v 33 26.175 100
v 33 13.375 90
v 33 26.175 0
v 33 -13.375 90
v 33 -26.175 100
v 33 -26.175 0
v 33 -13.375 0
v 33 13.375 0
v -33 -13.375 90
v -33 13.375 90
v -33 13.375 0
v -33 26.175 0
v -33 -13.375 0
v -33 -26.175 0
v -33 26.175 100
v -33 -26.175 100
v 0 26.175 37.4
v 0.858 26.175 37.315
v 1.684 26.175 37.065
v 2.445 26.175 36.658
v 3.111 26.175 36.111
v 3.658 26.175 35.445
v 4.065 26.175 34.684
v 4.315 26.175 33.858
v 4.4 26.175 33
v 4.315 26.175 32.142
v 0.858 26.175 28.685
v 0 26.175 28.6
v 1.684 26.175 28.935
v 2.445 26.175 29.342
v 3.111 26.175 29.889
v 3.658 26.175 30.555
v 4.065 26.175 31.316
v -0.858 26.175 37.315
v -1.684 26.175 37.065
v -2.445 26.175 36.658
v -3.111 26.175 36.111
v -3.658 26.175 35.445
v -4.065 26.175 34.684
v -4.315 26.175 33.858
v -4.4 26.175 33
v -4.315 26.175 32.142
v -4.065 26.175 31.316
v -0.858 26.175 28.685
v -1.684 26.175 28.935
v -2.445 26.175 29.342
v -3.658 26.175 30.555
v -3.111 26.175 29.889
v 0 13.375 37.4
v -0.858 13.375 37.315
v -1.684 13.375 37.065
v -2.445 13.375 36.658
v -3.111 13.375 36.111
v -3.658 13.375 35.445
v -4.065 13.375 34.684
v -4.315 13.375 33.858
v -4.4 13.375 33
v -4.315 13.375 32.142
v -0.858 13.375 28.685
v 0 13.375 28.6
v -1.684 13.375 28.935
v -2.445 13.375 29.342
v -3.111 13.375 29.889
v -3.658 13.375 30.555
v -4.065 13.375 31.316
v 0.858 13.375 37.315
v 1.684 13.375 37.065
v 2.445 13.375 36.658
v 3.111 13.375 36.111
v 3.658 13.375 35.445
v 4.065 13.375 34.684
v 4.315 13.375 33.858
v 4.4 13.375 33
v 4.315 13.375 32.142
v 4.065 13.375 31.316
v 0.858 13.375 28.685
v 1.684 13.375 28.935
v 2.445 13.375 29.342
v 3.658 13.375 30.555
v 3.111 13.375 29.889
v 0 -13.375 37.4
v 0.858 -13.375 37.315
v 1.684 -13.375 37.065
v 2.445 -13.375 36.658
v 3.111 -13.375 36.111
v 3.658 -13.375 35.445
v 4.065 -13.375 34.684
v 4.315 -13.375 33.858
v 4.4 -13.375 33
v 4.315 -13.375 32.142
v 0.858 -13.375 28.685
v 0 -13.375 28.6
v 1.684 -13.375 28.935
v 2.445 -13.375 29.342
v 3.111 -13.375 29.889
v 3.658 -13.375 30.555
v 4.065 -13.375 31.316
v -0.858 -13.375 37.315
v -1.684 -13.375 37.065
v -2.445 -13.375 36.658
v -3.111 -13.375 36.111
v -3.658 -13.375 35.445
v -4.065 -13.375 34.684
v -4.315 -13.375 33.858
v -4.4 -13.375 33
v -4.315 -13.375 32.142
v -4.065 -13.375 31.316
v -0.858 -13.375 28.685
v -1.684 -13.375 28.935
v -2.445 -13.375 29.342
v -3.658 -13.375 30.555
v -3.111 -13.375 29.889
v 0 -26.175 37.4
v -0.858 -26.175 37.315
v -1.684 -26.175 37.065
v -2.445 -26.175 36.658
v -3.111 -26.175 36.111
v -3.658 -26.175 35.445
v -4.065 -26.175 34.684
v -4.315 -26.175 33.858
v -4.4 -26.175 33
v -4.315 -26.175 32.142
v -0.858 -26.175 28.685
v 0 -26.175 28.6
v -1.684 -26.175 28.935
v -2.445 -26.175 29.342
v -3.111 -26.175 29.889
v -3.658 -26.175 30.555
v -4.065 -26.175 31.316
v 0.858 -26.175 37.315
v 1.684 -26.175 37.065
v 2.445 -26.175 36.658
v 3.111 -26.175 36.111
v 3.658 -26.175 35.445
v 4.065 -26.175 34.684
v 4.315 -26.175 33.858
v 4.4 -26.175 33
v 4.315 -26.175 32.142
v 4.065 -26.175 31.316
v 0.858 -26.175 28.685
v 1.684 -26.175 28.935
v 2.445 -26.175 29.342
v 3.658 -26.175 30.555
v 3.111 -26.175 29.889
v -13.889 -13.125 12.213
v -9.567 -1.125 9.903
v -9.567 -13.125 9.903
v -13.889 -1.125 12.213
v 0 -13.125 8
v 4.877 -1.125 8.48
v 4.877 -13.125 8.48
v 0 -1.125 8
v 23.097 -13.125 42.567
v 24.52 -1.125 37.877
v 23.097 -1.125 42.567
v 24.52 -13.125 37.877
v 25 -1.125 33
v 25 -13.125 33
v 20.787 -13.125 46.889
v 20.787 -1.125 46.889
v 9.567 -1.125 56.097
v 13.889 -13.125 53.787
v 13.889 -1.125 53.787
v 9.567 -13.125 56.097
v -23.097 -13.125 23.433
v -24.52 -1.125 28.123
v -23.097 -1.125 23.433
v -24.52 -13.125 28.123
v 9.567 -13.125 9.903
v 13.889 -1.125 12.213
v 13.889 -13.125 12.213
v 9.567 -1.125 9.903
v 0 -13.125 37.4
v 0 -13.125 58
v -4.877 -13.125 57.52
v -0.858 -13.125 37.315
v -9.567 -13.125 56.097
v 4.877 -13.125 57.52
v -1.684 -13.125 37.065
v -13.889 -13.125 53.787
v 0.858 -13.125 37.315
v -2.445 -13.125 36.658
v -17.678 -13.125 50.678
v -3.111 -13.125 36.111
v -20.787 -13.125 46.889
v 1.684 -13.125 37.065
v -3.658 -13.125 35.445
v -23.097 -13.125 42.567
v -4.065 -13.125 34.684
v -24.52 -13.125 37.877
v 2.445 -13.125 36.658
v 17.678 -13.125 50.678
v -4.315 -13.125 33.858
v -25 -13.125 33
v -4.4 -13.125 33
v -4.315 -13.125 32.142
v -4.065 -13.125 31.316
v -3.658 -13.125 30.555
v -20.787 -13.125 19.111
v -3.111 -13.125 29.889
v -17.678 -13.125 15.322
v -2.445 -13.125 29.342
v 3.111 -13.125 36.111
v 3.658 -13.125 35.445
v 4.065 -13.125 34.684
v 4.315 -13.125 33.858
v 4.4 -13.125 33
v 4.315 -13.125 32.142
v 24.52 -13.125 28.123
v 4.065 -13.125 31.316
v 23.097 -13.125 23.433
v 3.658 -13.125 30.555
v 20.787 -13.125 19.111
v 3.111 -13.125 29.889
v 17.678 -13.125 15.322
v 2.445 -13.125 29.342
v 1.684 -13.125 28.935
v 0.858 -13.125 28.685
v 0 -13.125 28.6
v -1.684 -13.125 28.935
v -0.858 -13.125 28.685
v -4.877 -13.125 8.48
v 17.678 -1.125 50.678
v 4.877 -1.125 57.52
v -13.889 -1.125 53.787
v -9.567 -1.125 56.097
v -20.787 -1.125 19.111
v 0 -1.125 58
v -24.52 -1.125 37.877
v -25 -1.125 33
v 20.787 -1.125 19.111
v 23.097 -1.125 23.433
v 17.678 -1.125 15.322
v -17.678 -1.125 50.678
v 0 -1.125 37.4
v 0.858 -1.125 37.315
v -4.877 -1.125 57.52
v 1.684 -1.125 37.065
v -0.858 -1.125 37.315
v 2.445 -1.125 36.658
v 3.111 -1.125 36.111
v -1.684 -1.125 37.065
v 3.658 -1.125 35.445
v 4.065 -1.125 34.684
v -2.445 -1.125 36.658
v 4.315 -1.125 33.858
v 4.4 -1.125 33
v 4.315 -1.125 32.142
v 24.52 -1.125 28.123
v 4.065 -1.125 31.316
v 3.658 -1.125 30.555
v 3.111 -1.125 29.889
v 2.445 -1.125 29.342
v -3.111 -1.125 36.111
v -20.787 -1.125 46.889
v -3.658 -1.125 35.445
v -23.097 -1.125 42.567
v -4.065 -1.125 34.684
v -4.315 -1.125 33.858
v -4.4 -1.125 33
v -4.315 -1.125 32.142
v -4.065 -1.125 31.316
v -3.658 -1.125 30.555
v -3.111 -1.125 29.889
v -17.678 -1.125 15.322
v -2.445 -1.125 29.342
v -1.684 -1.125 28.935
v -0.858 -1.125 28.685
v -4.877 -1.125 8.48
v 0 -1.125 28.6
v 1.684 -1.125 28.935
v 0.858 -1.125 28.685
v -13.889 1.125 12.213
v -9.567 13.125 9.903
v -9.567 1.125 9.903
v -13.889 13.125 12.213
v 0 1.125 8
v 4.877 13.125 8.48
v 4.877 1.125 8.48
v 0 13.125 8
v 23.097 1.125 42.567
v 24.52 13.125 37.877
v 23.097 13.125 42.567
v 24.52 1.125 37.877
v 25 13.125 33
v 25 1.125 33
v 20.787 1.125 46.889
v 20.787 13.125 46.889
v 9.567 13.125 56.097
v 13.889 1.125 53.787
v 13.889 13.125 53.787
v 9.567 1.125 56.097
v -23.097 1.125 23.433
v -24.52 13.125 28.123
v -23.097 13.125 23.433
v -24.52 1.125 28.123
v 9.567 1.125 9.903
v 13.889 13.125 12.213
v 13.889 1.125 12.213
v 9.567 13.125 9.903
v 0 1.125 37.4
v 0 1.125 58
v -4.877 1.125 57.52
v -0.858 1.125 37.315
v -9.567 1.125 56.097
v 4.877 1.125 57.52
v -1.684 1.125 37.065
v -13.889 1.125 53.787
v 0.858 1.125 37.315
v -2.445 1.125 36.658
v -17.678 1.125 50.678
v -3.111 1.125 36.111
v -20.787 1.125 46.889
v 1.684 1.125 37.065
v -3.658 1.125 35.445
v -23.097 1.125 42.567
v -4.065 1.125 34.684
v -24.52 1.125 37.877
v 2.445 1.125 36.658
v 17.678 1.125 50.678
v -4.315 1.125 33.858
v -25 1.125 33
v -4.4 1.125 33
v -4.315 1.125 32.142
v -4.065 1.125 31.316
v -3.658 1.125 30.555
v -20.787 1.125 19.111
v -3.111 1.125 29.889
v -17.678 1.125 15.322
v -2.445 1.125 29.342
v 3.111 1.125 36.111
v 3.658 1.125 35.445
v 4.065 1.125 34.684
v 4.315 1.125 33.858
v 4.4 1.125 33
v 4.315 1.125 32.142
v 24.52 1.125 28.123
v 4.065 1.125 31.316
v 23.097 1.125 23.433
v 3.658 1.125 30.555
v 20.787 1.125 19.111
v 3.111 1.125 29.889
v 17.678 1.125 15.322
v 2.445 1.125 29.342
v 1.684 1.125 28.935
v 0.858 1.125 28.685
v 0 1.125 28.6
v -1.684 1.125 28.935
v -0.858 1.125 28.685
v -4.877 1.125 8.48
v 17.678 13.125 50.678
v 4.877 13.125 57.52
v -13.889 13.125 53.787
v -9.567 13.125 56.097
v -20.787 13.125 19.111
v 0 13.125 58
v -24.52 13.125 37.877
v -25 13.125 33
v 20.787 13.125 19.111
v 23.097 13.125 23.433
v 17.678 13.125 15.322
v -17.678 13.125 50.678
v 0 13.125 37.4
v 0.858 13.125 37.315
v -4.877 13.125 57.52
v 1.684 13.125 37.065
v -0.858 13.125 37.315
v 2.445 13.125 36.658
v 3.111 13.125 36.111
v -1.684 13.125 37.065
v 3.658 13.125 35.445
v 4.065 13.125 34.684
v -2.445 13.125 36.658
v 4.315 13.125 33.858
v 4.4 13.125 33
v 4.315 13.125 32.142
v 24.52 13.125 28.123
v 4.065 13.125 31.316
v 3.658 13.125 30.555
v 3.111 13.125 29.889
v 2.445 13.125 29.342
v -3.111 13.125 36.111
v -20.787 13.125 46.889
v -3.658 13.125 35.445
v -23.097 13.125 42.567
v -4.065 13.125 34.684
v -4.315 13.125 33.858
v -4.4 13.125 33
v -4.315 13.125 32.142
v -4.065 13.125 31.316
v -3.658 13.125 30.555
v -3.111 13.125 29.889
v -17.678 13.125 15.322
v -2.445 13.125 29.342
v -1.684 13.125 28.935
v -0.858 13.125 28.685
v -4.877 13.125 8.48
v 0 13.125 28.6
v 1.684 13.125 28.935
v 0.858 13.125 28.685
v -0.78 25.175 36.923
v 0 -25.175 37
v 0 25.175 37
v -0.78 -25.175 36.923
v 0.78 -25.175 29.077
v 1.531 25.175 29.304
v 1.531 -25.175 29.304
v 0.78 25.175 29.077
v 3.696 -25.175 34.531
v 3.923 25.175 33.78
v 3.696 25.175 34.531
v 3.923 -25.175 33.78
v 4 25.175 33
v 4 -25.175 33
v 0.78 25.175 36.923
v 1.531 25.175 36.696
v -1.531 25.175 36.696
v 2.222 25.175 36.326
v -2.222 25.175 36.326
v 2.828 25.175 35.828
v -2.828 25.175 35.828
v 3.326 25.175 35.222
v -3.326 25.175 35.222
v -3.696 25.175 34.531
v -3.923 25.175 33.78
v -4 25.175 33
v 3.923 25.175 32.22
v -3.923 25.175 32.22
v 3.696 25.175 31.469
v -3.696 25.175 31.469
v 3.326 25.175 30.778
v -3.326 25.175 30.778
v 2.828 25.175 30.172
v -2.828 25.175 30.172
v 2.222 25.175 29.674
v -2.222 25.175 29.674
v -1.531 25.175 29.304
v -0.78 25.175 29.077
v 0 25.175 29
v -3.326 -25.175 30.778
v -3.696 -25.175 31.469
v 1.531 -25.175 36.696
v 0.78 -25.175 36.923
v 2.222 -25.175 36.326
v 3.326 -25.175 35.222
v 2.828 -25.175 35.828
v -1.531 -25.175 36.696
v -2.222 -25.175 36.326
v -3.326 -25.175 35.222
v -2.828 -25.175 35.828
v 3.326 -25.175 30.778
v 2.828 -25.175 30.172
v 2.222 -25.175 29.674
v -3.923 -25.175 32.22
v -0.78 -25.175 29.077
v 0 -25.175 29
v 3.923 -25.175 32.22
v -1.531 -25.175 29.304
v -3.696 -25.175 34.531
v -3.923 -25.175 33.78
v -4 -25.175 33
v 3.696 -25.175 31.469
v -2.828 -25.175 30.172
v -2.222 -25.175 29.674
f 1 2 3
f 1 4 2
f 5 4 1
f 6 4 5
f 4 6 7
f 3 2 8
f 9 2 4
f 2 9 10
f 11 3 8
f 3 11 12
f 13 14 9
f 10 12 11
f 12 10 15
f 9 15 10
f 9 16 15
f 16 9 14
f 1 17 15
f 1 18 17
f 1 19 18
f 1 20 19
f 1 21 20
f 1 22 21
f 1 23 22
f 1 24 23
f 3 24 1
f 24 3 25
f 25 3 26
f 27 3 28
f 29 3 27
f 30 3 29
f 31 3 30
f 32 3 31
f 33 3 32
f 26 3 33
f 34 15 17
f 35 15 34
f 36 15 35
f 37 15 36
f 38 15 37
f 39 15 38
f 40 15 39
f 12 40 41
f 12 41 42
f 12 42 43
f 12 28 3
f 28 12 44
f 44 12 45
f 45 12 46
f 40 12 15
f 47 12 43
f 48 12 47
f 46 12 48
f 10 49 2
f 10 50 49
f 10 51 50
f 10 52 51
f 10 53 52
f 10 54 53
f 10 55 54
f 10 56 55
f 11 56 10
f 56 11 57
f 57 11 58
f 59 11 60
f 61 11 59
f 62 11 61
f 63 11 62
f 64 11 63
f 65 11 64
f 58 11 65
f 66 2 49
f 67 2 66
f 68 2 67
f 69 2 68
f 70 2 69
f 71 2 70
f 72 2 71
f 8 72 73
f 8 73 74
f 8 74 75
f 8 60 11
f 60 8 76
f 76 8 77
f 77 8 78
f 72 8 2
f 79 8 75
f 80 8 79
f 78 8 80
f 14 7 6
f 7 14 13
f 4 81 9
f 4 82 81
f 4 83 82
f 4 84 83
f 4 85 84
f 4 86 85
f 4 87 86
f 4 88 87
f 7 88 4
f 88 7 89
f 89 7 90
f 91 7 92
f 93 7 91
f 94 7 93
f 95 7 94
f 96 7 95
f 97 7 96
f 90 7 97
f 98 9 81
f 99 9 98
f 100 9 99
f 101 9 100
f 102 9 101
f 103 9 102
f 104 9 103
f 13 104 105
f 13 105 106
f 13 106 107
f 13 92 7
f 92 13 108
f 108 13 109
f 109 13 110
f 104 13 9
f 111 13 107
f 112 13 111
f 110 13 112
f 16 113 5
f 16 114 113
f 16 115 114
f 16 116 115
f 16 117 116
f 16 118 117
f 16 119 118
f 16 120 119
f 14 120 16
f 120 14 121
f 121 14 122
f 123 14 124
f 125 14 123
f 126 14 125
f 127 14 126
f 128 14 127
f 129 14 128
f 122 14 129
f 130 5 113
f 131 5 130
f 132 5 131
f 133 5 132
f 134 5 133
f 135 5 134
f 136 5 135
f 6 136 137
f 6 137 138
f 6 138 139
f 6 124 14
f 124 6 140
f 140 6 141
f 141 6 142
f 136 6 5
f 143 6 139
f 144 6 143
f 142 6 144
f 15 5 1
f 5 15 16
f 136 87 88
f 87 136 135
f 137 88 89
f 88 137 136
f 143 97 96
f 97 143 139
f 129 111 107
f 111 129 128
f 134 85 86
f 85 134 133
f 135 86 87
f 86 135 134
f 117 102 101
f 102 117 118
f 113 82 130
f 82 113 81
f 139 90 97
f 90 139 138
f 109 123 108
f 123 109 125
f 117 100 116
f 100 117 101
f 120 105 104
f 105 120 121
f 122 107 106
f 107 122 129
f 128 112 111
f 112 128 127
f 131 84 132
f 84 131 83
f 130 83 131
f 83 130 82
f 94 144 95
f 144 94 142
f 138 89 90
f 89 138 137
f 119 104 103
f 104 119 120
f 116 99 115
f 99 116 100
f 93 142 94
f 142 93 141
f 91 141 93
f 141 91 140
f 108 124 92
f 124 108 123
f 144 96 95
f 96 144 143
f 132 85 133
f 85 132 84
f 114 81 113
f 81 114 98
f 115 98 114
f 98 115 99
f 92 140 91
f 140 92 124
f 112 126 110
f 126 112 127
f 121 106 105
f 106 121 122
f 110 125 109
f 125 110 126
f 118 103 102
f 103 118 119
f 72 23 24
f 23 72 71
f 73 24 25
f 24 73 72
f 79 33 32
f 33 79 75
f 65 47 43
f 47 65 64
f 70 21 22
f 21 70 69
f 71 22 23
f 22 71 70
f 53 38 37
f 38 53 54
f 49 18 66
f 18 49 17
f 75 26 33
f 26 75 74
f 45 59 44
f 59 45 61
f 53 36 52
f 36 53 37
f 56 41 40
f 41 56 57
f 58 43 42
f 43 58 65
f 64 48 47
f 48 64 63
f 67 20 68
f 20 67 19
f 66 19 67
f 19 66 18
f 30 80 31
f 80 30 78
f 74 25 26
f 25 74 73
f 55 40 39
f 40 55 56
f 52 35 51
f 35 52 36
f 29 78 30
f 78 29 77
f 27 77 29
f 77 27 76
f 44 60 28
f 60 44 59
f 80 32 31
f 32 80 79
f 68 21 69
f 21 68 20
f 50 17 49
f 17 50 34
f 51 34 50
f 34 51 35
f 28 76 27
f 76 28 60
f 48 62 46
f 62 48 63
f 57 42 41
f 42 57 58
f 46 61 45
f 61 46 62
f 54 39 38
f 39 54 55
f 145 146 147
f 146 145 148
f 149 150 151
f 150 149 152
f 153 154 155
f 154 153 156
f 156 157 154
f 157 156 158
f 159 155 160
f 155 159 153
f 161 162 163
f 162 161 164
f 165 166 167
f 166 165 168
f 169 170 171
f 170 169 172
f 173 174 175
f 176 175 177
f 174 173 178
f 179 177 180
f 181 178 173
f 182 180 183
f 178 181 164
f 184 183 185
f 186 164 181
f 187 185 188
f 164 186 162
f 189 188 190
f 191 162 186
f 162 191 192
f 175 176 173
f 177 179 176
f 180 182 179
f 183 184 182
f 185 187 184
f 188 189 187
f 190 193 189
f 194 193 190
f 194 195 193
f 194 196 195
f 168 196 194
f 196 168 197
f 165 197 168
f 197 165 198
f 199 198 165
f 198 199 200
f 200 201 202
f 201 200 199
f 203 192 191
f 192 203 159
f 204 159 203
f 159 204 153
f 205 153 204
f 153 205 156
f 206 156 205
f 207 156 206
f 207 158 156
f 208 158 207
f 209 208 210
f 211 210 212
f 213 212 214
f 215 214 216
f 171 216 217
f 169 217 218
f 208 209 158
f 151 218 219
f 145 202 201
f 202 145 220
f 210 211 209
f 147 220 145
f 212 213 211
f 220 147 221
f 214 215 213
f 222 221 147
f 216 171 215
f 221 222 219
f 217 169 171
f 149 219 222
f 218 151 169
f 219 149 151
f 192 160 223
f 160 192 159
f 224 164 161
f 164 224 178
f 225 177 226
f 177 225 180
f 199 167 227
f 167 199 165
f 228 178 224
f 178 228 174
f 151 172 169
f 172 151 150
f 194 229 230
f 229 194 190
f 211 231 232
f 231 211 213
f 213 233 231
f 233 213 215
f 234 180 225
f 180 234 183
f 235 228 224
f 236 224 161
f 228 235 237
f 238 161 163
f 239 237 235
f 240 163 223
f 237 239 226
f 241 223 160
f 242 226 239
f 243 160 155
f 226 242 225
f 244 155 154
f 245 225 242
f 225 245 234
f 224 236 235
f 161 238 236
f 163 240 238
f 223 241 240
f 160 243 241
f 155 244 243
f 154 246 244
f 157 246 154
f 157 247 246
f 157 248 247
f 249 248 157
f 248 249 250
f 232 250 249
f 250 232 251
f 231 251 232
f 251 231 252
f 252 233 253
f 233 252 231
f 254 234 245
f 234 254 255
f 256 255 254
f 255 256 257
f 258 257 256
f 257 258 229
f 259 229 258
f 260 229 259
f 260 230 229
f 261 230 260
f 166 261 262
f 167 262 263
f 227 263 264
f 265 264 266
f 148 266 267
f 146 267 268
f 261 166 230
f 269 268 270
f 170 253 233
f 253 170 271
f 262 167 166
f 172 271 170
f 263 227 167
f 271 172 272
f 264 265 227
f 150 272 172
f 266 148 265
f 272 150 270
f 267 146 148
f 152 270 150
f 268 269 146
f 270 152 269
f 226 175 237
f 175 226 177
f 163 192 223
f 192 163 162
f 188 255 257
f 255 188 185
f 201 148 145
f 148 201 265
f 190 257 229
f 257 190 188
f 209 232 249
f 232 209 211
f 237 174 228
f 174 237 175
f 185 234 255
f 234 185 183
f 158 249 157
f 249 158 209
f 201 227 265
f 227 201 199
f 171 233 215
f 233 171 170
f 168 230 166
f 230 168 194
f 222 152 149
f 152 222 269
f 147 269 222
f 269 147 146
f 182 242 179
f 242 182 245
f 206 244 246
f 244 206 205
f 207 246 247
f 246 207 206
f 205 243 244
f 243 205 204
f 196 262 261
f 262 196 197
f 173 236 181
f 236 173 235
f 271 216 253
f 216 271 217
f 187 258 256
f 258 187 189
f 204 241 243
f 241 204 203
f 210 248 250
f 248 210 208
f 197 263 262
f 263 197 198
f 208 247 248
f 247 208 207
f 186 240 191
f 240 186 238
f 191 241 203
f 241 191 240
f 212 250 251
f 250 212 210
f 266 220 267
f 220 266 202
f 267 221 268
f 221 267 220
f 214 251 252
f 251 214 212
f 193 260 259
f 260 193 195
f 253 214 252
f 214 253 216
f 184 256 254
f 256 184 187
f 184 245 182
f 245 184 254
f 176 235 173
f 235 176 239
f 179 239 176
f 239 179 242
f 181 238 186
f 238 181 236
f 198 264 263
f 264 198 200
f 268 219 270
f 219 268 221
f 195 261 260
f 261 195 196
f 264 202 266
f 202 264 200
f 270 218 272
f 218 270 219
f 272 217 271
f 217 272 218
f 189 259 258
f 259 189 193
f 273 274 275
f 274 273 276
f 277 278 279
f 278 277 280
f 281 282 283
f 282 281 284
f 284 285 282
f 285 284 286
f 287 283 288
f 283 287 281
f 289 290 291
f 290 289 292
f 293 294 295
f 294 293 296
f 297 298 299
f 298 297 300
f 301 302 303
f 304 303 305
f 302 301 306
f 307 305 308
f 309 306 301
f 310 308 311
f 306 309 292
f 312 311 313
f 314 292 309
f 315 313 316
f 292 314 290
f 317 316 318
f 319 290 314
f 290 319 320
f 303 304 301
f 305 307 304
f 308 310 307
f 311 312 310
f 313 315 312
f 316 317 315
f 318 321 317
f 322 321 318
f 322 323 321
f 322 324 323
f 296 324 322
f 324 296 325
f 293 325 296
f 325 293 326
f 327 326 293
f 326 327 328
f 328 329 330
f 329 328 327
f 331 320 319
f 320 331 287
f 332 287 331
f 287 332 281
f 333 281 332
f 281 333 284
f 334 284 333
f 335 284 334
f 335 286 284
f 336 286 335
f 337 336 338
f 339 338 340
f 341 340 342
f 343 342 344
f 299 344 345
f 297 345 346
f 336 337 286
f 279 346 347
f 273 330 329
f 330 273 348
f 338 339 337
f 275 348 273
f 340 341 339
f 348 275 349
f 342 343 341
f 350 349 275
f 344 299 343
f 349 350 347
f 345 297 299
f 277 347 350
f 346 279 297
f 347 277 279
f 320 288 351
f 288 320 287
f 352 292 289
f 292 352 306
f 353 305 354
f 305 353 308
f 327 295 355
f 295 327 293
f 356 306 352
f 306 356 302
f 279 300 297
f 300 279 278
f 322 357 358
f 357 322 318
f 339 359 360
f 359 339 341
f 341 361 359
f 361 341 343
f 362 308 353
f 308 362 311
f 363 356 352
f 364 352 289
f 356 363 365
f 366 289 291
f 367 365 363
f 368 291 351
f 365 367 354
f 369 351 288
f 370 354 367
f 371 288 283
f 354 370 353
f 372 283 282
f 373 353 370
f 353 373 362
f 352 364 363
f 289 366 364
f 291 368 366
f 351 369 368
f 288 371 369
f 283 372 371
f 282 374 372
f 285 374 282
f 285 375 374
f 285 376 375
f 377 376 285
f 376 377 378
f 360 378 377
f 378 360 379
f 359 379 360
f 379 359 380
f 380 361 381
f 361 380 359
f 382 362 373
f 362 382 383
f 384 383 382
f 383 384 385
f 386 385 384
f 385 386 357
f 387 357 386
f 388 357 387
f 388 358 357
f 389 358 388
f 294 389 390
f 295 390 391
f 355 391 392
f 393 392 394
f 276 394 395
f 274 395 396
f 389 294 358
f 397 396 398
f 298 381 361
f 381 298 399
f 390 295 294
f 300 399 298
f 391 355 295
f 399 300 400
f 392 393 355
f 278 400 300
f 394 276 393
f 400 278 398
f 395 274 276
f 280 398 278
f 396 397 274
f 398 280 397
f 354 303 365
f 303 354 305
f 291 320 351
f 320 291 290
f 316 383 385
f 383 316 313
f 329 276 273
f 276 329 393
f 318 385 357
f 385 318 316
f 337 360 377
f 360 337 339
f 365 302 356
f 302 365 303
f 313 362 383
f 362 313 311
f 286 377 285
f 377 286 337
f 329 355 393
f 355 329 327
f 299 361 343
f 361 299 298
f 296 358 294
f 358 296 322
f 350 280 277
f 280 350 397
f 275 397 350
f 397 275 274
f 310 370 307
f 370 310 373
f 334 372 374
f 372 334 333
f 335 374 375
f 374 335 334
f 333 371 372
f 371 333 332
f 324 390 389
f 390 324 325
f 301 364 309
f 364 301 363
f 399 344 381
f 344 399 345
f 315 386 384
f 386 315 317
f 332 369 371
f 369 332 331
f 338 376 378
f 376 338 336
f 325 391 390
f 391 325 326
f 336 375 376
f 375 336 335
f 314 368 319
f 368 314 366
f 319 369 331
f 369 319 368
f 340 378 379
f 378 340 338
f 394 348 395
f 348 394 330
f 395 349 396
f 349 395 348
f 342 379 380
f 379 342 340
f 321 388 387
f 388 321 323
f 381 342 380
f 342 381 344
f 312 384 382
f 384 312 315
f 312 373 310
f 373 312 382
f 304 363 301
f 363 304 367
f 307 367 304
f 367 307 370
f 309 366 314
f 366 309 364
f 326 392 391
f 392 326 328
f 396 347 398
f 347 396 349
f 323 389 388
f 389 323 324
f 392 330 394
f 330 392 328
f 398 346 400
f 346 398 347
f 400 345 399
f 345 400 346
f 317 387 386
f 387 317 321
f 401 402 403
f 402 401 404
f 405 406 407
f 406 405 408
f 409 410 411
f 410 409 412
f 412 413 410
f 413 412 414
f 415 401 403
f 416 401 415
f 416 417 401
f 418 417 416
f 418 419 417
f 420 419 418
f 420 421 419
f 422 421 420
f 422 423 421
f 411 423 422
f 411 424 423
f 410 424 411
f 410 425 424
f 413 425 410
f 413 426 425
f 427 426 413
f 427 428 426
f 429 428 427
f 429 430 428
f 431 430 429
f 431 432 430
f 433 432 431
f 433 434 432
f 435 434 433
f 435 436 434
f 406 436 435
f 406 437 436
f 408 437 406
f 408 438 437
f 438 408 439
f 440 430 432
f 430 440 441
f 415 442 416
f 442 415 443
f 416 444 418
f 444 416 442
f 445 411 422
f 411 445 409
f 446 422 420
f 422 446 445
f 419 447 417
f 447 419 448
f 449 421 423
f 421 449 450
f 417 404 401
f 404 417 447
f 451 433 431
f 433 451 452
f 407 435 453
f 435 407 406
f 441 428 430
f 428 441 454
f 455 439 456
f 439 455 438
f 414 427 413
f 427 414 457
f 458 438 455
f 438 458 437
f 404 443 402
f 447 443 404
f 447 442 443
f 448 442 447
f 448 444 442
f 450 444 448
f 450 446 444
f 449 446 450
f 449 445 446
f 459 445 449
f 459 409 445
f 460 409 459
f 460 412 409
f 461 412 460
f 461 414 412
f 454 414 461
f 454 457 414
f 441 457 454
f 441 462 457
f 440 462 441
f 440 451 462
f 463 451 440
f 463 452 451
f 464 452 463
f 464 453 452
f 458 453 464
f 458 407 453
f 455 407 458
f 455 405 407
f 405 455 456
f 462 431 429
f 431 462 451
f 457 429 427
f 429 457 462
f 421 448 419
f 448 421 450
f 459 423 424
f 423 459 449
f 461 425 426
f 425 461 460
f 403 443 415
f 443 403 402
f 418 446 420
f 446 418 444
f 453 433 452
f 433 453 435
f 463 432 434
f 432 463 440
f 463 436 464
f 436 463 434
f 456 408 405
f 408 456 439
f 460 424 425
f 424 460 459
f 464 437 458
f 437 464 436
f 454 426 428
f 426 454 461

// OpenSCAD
$fn = 32;

// ------------------------------------------------------------------------
// Trolley wheel set: wheels d50, fork 90 mm tall
// Every part is its own module, assembly() places every instance.
// ------------------------------------------------------------------------

// --- part 1 ---
module trolley_fork() {
  difference() {
    union() {
      translate([-33, 13.375, 0]) cube([66, 12.8, 90]);
      translate([-33, -26.175, 0]) cube([66, 12.8, 90]);
      translate([-33, -26.175, 90]) cube([66, 52.35, 10]);
    }
    translate([0, -19.775, 33]) rotate([90, 0, 0]) cylinder(h = 14.8, d = 8.8, center = true);
    translate([0, 19.775, 33]) rotate([90, 0, 0]) cylinder(h = 14.8, d = 8.8, center = true);
  }
}

// --- part 2 ---
module trolley_wheel() {
  difference() {
      translate([0, 0, 0]) cylinder(h = 12, d = 50);
      translate([0, 0, -1]) cylinder(h = 14, d = 8.8);
    }
}

// --- part 3 ---
module trolley_axle() {
  translate([0, 0, -25.175]) cylinder(h = 50.35, d = 8);
}

// --- assembly ---
module assembly() {
  color([0.80, 0.24, 0.20]) translate([0, 0, 0]) rotate([0, 0, 0]) trolley_fork();
  color([0.20, 0.45, 0.75]) translate([0, -1.125, 33]) rotate([90, 0, 0]) trolley_wheel();
  color([0.25, 0.62, 0.32]) translate([0, 13.125, 33]) rotate([90, 0, 0]) trolley_wheel();
  color([0.92, 0.70, 0.18]) translate([0, 0, 33]) rotate([90, 0, 0]) trolley_axle();
}

assembly();
